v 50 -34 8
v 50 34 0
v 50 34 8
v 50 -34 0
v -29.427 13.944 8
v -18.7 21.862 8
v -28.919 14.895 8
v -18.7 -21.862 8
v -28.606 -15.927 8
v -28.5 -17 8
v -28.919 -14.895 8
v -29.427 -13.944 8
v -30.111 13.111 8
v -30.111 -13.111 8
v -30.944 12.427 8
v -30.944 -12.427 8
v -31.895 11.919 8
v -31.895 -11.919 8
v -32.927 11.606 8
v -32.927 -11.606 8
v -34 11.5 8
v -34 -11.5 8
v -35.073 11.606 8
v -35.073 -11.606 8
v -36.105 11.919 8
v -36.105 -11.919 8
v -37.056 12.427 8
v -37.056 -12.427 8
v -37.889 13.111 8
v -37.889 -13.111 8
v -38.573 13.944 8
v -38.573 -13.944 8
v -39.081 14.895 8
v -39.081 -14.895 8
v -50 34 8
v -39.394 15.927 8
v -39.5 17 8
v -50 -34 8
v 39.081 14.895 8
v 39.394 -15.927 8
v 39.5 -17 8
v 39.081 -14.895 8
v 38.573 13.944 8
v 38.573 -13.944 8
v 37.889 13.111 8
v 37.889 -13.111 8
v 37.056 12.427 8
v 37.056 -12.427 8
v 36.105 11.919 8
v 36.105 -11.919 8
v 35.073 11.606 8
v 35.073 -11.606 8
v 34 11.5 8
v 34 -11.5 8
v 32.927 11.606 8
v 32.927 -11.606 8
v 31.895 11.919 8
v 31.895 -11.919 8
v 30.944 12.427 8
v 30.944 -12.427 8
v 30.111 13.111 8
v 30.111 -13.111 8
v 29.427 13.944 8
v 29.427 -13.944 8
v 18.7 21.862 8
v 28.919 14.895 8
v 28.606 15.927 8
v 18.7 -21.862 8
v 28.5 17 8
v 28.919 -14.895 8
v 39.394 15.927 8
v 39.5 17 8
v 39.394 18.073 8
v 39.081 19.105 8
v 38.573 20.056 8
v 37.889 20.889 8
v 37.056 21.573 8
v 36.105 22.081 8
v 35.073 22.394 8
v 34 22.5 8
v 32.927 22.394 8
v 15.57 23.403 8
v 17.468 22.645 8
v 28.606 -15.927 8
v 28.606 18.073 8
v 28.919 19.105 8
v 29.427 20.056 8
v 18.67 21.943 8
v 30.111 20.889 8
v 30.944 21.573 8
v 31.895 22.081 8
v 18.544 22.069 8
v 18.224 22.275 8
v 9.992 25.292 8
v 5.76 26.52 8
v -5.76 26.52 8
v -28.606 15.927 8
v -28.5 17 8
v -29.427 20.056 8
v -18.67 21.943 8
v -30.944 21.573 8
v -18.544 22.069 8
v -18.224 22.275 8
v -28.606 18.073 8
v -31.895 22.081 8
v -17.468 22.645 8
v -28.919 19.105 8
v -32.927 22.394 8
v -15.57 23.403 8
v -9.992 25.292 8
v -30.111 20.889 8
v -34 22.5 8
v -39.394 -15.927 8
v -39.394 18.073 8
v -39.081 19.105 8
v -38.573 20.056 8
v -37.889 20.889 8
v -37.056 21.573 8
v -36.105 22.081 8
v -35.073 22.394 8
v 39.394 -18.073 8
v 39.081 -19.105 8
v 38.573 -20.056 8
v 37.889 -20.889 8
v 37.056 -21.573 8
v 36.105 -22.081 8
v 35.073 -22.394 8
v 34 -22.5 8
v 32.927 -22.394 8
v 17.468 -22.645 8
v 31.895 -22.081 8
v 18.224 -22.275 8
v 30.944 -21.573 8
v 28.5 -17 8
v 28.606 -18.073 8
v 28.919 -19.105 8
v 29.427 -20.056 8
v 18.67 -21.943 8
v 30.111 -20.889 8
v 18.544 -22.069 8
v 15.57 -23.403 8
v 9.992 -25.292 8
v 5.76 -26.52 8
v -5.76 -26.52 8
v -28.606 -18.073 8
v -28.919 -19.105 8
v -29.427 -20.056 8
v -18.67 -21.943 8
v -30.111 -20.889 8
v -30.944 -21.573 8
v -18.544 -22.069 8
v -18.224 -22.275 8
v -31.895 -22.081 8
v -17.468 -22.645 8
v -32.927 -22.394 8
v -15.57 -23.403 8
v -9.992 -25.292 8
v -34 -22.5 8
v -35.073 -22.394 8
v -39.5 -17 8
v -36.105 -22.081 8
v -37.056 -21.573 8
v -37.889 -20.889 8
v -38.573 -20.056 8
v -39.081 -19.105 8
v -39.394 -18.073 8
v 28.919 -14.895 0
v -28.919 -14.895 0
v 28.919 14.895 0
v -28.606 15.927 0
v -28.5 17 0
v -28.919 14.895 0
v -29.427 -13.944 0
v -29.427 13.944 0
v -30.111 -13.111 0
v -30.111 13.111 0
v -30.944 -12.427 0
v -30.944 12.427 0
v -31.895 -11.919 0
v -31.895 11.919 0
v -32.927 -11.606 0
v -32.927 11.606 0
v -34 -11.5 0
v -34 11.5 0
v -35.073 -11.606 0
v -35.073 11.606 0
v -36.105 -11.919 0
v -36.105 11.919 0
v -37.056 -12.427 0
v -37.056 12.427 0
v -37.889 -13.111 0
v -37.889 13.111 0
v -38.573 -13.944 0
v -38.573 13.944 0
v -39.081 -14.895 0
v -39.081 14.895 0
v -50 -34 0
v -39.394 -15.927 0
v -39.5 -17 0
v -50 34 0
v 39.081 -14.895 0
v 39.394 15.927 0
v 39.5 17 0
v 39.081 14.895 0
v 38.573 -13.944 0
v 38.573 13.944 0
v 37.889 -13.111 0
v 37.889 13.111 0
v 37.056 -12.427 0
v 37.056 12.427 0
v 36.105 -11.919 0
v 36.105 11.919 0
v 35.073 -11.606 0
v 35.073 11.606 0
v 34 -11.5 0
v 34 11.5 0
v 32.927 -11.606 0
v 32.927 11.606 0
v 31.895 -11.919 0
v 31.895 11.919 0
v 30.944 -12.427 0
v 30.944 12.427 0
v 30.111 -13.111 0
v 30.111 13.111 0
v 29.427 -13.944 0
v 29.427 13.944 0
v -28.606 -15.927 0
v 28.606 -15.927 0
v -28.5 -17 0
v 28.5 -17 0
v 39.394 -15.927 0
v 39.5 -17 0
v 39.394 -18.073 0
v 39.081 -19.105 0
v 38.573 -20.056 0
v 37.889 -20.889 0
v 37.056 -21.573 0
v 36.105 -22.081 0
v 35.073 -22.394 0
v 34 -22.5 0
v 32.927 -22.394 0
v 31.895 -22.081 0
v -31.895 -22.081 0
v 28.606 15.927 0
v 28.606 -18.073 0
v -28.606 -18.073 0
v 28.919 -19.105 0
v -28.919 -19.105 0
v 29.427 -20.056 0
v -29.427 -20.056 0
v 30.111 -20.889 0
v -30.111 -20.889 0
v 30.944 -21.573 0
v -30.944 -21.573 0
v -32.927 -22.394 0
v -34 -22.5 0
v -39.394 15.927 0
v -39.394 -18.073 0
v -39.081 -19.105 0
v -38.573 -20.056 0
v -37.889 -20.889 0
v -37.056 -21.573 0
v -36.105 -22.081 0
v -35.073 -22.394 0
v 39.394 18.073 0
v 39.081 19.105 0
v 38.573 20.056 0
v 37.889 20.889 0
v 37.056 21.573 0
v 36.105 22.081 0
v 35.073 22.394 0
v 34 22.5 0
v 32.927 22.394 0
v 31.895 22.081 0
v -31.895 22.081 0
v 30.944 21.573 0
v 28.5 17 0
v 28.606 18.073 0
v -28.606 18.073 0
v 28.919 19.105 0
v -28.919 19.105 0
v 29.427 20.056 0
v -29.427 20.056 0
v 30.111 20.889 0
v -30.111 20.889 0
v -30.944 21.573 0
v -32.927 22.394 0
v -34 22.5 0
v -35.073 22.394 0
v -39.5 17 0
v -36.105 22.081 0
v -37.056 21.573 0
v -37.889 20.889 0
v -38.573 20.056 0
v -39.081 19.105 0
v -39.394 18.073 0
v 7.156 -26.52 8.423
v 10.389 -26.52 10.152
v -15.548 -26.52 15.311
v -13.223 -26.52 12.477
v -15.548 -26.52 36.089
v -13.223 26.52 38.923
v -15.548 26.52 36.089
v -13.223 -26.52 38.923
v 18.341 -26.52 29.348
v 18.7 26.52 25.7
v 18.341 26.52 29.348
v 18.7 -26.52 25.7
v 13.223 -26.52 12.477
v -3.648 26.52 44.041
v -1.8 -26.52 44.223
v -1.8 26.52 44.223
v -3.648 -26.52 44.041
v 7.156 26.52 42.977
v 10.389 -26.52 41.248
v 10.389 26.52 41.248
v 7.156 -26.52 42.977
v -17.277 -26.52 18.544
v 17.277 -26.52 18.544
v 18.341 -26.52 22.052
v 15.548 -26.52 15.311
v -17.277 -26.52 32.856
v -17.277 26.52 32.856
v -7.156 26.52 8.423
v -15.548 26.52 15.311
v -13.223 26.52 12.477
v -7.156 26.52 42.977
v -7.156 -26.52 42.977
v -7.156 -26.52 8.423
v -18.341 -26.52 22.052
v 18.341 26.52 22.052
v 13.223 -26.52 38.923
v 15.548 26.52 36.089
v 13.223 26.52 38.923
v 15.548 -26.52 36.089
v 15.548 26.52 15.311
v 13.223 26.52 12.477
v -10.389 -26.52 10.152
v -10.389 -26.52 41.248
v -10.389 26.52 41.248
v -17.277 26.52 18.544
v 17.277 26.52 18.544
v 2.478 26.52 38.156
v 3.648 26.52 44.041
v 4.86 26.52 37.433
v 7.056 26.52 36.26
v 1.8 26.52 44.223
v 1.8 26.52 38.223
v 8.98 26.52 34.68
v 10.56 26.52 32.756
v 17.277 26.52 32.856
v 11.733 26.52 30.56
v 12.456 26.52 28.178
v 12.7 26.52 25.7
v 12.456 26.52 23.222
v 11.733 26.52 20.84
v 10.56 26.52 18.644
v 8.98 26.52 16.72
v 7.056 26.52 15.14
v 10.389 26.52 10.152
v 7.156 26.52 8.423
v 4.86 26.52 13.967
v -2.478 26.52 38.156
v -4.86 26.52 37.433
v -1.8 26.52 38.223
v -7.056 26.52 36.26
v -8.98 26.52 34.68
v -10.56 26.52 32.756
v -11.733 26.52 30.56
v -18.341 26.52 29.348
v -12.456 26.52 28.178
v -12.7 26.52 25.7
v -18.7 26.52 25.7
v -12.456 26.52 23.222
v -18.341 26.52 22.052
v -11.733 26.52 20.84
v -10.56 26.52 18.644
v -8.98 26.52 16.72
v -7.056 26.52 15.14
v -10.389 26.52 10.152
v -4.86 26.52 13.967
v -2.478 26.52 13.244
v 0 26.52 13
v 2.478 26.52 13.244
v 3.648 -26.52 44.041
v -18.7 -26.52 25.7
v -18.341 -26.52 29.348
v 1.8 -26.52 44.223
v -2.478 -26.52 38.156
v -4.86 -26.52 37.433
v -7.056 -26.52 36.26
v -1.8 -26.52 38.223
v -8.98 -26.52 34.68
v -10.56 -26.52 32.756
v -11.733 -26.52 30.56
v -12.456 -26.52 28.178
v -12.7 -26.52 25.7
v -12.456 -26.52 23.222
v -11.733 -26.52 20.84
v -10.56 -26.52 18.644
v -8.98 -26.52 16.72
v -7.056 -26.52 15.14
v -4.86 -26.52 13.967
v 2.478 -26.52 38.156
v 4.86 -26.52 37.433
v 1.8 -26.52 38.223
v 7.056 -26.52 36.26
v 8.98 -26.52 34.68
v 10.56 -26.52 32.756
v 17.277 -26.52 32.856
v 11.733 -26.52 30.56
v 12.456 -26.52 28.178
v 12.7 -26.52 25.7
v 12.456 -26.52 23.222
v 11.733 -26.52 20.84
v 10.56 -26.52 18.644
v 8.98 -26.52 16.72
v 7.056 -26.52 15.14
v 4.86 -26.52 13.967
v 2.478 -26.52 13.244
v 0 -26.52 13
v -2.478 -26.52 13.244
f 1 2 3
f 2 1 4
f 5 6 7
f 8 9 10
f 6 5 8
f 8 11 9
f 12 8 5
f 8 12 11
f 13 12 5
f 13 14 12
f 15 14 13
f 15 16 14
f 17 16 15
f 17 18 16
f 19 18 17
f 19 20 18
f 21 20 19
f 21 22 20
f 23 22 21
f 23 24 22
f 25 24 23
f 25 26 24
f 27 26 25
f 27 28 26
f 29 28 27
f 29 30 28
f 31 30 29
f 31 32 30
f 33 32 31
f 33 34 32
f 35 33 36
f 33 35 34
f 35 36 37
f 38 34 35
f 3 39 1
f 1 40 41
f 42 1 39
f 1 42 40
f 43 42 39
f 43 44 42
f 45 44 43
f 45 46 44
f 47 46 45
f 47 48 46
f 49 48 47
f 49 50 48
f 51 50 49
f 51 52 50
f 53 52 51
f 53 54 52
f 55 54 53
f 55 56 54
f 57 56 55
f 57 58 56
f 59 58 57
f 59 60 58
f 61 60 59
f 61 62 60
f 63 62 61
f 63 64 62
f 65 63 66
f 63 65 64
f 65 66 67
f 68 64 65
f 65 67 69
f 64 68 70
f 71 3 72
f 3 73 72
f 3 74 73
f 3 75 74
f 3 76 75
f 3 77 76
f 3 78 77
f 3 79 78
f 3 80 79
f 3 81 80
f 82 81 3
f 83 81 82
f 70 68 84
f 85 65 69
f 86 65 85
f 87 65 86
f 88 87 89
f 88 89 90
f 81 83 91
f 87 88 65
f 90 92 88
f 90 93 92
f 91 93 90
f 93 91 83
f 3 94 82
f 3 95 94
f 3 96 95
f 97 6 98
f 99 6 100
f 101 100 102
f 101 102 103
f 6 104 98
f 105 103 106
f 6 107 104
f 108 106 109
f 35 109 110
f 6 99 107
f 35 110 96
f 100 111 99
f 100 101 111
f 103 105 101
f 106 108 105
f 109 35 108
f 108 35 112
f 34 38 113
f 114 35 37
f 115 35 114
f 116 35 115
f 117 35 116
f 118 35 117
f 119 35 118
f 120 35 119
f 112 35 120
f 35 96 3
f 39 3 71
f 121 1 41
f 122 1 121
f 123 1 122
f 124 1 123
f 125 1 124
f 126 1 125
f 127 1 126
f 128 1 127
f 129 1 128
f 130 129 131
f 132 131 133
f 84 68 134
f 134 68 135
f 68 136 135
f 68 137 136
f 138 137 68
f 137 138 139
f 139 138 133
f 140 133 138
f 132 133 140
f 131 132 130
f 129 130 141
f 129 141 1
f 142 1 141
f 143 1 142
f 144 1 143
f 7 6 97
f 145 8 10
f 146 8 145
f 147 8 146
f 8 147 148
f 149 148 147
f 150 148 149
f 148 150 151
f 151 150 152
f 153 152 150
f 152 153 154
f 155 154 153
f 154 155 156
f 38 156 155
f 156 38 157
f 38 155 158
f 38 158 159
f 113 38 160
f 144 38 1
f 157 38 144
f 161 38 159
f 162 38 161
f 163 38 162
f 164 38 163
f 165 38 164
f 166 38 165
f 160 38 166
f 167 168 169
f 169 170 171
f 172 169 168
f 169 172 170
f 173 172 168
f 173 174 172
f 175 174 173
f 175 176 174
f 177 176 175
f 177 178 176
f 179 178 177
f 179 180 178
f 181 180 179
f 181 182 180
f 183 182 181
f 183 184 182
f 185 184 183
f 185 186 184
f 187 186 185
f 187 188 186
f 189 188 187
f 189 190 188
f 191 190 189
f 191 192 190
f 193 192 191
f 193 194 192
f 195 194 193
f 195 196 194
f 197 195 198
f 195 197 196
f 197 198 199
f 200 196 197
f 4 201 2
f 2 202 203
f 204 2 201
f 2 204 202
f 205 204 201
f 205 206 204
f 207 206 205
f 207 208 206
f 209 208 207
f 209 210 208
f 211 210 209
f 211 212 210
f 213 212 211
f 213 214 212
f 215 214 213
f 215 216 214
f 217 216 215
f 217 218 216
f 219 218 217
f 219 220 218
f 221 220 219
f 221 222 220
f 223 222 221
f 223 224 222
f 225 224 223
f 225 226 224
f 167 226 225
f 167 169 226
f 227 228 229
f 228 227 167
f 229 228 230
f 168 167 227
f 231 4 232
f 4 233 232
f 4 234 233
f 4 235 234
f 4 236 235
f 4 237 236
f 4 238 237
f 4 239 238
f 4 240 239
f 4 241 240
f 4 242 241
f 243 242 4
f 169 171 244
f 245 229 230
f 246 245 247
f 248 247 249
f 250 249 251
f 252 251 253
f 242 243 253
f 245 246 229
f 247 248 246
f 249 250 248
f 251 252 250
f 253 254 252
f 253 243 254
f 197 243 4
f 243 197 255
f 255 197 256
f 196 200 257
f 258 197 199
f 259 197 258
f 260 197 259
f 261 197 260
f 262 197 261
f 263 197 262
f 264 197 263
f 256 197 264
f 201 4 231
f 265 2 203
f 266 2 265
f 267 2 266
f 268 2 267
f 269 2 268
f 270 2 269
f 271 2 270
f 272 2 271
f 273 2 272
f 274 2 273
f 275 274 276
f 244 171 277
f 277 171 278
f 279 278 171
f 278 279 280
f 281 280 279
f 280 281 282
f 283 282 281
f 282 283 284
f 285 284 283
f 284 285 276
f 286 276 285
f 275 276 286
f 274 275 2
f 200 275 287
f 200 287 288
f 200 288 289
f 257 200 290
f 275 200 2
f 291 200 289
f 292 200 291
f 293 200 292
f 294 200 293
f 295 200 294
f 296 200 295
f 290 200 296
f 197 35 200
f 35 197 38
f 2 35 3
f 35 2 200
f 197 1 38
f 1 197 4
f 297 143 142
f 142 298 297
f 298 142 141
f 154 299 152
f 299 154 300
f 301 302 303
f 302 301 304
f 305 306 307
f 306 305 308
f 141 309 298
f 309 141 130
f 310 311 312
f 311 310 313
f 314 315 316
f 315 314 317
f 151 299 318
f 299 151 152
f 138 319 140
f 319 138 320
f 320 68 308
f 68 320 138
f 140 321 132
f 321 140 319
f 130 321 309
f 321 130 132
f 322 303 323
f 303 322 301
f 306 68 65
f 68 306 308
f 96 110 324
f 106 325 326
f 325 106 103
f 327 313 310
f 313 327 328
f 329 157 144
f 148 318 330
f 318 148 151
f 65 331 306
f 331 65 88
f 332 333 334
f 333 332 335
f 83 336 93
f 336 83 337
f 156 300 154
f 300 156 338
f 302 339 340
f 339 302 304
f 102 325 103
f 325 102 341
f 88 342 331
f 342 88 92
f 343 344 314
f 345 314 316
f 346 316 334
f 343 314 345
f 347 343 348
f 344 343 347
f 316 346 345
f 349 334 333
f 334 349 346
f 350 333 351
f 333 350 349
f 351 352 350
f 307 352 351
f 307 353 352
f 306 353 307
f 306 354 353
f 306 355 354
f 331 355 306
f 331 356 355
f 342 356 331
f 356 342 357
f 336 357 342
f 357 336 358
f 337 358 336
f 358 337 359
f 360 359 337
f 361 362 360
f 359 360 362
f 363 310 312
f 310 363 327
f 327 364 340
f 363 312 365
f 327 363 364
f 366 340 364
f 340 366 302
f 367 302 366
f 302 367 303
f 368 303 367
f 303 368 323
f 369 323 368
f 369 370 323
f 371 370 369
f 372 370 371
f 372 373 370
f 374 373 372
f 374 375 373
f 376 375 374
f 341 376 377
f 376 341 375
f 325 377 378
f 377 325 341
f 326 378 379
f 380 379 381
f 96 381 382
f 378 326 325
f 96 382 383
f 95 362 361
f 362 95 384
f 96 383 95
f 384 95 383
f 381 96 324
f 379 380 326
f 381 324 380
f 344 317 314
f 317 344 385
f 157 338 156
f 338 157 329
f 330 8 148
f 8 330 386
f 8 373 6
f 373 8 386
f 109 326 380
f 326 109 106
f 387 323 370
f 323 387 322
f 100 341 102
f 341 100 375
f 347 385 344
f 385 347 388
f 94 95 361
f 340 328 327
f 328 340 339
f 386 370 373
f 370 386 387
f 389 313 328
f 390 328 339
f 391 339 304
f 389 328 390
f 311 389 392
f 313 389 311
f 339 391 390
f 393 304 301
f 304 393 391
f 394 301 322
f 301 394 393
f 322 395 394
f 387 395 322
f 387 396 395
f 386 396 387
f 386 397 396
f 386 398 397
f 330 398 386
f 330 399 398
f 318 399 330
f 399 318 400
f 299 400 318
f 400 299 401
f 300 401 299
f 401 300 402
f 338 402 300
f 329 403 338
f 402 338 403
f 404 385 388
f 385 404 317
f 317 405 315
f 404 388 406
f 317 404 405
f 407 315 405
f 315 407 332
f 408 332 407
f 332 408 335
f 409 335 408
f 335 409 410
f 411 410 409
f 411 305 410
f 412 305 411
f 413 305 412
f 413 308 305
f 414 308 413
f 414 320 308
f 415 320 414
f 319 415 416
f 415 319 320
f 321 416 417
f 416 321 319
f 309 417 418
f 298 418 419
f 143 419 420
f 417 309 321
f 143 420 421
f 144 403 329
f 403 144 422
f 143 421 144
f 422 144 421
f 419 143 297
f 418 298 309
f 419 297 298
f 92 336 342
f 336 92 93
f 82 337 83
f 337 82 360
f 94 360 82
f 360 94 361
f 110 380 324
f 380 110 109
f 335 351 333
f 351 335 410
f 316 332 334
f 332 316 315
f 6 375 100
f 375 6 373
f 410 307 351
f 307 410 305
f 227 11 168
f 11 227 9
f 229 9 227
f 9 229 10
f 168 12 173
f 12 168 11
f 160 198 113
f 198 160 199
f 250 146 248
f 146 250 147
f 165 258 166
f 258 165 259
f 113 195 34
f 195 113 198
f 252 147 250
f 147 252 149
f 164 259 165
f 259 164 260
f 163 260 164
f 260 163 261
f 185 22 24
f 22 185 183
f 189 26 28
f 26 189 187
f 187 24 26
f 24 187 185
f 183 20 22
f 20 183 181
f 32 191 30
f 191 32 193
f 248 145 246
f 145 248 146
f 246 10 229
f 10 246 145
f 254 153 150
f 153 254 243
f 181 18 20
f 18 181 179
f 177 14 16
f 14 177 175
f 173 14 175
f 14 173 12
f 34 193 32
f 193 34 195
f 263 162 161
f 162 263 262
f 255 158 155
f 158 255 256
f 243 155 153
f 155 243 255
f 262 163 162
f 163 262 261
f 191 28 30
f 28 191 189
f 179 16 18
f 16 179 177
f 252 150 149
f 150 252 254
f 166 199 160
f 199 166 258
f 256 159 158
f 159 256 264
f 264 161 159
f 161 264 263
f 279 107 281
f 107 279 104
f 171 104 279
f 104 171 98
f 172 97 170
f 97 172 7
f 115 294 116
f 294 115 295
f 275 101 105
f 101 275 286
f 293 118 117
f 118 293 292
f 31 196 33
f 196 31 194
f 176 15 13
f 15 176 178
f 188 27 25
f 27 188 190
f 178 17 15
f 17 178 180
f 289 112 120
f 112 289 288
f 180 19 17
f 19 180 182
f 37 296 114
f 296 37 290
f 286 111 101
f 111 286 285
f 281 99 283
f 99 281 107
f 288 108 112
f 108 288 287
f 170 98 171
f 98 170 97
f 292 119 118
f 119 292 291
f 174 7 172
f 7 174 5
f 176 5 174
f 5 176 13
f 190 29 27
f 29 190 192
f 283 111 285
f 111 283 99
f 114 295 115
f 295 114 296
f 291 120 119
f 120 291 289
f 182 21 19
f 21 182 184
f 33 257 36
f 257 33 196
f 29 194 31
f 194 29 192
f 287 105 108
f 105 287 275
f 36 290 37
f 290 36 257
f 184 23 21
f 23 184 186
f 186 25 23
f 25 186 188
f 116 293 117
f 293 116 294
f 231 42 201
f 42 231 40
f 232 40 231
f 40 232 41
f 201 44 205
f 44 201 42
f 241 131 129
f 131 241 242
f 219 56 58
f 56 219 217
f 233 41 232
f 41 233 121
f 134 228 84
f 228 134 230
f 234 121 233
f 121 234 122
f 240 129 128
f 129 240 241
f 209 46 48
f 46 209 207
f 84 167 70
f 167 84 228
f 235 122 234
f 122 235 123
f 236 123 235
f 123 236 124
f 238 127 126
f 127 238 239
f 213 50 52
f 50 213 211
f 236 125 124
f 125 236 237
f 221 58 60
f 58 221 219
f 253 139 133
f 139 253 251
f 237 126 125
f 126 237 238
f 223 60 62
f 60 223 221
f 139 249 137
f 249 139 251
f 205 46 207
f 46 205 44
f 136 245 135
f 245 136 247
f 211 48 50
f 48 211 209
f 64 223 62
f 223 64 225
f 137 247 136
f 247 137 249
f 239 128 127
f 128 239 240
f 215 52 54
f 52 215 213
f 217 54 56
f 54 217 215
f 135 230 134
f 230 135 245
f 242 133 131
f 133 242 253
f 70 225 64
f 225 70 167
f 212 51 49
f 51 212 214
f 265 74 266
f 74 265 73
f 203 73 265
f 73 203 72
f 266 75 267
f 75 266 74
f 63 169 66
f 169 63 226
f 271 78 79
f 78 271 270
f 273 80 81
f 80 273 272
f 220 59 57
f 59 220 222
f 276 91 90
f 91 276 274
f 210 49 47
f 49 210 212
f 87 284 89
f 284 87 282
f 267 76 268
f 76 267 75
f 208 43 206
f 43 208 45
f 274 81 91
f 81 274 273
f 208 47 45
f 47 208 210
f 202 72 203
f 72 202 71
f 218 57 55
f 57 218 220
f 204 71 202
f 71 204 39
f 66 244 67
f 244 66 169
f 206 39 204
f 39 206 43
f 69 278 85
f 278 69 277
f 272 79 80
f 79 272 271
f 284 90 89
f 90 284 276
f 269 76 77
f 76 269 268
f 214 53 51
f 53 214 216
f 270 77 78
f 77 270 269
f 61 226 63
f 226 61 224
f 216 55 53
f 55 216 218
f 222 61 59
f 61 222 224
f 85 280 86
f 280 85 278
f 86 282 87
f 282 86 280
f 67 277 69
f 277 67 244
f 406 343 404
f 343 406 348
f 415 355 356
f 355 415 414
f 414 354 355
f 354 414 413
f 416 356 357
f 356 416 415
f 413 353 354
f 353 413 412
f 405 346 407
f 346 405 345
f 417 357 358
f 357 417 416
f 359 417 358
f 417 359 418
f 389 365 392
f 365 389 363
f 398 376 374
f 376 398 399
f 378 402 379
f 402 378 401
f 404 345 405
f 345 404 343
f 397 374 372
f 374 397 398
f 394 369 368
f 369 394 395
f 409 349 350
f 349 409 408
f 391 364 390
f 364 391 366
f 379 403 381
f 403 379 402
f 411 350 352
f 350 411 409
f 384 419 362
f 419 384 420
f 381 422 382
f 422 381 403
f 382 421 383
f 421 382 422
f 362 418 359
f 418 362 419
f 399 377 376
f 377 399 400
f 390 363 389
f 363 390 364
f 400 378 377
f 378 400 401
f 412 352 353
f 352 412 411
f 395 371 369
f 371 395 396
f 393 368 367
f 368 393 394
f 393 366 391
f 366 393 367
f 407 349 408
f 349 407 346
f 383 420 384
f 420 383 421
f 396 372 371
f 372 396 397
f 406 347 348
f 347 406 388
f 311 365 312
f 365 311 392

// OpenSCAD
$fn = 32;

// ----------------------------------------------------------------------
// Bearing block: 100 x 68 mm base, 25.4 mm bore at 25.7 mm
// ----------------------------------------------------------------------

// --- parameters (mm) ---
base_w = 100;             // base width
base_d = 68;              // base depth
base_t = 8;               // base thickness
bore_d = 25.4;            // shaft / bearing bore
house_r = 18.7;           // housing outer radius
house_len = 53.04;        // housing length along the shaft
foot_w = 37.4;            // foot width under the housing
foot_len = 43.04;         // foot length along the shaft
axis_z = 25.7;            // bore axis height above the base
holes_d = 11;             // mounting holes
hole_x = 34;              // mounting hole spacing
groove_w = 3.6;           // oil groove width

difference() {
  union() {
    /* base plate with its underside on z = 0 */
    translate([0, 0, base_t / 2]) cube([base_w, base_d, base_t], center = true);
    /* hull foot: a straight web blending into the round housing */
    hull() {
      translate([0, 0, base_t - 0.5]) cube([foot_w, foot_len, 1.6], center = true);
      translate([0, 0, axis_z]) rotate([-90, 0, 0]) cylinder(h = house_len, d = 2 * house_r, center = true);
    }
  }
  /* bore through the housing, 2.5 mm clear on both sides */
  translate([0, 0, axis_z]) rotate([-90, 0, 0]) cylinder(h = house_len + 5, d = bore_d, center = true);
  /* oil groove from the top of the housing into the bore */
  translate([-groove_w / 2, -house_len / 2 - 2.5, axis_z + bore_d * 0.17]) cube([groove_w, house_len + 5, house_r + 5]);
  /* mounting holes through the base plate */
  for (hx = [-34, 34]) {
    for (hy = [-17, 17]) {
      translate([hx, hy, -2.5]) cylinder(h = base_t + 5, d = holes_d);
    }
  }
}
